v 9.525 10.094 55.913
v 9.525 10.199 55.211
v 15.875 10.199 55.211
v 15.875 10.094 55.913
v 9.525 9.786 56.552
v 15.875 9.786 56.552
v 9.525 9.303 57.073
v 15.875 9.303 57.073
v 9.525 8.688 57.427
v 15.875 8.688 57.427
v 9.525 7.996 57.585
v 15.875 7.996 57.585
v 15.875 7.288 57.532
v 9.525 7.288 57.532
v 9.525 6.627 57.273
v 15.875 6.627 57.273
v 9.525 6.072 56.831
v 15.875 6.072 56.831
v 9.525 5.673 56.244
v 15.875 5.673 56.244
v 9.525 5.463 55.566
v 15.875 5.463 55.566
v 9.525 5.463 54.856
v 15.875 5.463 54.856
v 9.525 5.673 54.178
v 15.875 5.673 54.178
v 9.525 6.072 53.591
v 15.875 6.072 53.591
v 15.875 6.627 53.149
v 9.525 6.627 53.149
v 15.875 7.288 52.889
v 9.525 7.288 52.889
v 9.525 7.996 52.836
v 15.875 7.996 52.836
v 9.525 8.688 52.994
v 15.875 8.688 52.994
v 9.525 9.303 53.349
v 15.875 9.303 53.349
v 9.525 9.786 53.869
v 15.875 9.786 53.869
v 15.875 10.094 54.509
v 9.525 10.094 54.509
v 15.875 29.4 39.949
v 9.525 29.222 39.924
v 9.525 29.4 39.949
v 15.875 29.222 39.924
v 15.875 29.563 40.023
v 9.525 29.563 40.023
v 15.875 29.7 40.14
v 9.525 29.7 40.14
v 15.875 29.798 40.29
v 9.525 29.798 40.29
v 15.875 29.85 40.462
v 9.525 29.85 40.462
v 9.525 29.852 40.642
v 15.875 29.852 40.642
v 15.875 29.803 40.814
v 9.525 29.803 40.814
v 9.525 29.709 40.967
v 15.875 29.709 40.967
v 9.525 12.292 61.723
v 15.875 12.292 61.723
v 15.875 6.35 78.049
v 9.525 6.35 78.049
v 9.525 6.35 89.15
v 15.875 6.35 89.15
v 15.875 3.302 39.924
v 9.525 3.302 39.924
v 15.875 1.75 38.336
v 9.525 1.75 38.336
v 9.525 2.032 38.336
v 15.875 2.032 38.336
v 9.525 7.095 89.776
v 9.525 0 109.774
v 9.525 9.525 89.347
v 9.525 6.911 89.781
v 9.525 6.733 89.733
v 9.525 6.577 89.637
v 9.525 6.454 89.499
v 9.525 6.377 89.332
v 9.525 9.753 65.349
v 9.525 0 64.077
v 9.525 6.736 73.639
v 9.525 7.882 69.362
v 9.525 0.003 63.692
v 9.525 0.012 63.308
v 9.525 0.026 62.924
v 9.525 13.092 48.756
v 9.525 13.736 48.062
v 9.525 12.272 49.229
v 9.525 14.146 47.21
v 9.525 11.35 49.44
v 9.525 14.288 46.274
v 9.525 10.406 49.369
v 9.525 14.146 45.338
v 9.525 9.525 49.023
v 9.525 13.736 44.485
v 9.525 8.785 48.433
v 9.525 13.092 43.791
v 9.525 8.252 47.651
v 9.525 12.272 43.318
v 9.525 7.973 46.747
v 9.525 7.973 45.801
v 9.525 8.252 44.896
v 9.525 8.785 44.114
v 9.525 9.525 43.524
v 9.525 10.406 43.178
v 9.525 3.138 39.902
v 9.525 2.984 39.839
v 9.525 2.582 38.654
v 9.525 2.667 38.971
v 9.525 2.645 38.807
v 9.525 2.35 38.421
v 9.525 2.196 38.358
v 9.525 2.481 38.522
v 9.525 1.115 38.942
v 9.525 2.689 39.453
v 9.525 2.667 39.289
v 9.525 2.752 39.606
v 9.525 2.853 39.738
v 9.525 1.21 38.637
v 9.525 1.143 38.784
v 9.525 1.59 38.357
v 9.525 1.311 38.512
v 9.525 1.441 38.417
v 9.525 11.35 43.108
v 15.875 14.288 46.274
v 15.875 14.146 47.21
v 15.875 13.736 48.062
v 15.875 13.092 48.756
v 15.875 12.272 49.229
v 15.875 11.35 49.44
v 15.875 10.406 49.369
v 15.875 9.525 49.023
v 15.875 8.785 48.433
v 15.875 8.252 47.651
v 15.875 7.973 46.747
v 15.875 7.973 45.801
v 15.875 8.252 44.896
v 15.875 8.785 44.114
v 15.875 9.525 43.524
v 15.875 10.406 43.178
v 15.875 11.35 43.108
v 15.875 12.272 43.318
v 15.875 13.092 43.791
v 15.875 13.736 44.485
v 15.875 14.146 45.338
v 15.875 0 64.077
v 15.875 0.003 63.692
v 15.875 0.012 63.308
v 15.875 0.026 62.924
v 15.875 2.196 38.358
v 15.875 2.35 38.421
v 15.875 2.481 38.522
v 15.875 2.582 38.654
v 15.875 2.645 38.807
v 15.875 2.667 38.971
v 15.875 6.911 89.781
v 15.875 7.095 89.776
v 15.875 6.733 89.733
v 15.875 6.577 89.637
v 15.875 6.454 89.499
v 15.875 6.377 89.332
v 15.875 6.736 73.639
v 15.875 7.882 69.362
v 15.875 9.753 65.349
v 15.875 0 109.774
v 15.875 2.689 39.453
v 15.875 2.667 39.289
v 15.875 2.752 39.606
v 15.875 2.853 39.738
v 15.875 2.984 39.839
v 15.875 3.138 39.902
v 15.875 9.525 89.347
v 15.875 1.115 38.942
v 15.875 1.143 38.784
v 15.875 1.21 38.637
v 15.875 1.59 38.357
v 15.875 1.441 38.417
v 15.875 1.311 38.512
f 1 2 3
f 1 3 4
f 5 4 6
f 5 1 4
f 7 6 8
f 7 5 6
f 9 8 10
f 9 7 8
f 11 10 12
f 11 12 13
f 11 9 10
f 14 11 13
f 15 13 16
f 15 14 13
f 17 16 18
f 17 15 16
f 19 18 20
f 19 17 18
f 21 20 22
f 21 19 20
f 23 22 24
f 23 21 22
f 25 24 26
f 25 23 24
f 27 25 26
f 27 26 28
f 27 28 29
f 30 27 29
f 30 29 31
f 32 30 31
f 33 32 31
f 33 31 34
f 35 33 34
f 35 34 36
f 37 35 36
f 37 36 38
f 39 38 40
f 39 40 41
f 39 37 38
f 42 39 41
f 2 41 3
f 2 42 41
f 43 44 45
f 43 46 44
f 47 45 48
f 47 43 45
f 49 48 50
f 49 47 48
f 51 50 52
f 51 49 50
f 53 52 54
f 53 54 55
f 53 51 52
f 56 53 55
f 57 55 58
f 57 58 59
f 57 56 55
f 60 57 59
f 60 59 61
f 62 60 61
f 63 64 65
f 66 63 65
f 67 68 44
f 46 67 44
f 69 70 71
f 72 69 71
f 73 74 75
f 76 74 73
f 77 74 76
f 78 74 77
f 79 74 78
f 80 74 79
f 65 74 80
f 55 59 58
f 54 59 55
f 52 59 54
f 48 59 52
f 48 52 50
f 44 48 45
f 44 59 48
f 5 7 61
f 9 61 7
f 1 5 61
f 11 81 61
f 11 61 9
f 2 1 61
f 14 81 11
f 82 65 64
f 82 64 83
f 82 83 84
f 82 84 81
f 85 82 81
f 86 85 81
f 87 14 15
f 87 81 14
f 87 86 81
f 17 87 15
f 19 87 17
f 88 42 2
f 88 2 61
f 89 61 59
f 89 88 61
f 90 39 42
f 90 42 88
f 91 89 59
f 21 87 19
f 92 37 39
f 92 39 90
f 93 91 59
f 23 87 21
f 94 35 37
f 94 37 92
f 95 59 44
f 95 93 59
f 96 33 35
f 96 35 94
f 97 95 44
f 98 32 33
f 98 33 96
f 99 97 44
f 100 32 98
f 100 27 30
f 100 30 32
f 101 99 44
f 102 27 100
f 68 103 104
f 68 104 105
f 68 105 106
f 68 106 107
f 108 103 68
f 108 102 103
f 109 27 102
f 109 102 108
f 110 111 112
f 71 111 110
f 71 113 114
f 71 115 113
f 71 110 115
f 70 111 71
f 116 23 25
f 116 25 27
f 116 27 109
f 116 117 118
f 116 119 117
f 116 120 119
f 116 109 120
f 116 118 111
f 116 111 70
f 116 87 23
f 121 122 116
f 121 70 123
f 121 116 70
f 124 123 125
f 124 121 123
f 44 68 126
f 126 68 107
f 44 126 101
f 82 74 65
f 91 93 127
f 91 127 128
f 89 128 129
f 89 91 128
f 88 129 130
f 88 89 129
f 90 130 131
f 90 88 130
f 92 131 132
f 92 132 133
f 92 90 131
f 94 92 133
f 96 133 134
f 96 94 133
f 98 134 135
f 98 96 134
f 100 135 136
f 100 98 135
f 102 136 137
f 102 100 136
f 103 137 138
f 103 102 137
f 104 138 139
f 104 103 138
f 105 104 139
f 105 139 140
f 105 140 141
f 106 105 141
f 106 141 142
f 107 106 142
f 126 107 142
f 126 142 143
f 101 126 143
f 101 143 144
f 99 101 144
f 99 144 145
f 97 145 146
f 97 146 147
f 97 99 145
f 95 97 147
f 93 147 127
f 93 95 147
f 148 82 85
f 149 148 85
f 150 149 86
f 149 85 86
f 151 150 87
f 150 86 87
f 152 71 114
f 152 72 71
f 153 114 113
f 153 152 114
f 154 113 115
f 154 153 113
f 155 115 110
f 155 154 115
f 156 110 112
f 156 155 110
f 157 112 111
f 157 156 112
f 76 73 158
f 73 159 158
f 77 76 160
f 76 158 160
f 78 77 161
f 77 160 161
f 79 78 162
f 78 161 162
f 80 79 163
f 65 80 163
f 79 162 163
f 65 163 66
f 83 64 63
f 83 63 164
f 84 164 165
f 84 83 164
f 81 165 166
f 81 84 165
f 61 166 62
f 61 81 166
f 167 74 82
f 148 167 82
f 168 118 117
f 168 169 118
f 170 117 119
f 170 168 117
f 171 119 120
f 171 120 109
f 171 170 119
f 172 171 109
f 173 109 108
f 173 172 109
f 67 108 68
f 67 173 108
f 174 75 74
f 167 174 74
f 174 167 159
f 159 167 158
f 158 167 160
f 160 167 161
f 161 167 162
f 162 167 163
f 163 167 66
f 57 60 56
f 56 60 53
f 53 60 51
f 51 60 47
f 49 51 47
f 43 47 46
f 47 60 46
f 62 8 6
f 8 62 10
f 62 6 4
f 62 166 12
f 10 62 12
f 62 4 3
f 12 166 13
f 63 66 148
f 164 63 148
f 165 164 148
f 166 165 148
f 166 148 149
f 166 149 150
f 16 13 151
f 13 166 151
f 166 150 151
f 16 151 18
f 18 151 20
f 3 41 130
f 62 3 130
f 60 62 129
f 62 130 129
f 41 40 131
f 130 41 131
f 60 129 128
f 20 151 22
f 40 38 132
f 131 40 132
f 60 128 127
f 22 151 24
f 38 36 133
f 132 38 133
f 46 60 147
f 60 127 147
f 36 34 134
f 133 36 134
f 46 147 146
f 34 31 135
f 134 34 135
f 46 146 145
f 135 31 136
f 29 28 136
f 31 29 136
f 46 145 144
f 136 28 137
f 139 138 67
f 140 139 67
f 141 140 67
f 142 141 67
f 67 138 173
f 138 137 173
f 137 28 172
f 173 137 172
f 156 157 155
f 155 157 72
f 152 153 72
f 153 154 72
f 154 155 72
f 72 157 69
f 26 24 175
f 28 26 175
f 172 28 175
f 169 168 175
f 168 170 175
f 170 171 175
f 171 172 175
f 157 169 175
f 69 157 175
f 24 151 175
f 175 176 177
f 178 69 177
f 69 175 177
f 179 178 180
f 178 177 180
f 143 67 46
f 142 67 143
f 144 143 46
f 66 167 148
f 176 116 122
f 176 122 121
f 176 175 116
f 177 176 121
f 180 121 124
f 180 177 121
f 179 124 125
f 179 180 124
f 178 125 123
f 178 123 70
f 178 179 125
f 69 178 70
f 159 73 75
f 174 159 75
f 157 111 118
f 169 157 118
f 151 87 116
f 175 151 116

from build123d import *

# Parameters (mm, degrees)
STOCK_BEE_ZERKER_START                       = 9.525
STOCK_BEE_ZERKER_2_0_MULTIBODY_1_OUTLINE_R   = 3.175
STOCK_BEE_ZERKER_2_0_MULTIBODY_1_OUTLINE_R_2 = 2.38125
STOCK_BEE_ZERKER_2_0_MULTIBODY_1_DEPTH       = 6.35
FILLET1_R                                    = 0.635
FILLET2_R                                    = 25.4


# Read off the part's stored shape, not the designer's step: Stock-Bee-zerker 2.0 Multibody-1
with BuildPart() as part:
    # Stock-Bee-zerker 2.0 Multibody-1 outline → Stock-Bee-zerker 2.0 Multibody-1 (new body)
    with BuildSketch(Plane.YZ.offset(STOCK_BEE_ZERKER_START)):
        Polygon((0, 63.5), (1.143, 38.33622), (2.667, 38.33622), (2.667, 39.92372), (30.58384403, 39.92372), (6.35, 68.804490685), (6.35, 89.907129746), (9.525, 89.347291582), (0, 109.77372), align=None)
        with Locations((11.1125, 46.27372)):
            Circle(STOCK_BEE_ZERKER_2_0_MULTIBODY_1_OUTLINE_R, mode=Mode.SUBTRACT)
        with Locations((7.818068754, 55.210853084)):
            Circle(STOCK_BEE_ZERKER_2_0_MULTIBODY_1_OUTLINE_R_2, mode=Mode.SUBTRACT)
    extrude(amount=STOCK_BEE_ZERKER_2_0_MULTIBODY_1_DEPTH)

    # Fillet1
    fillet1_edges = [part.edges().sort_by_distance(p)[0] for p in [
        (12.7, 6.35, 89.907129746),
        (12.7, 30.58384403, 39.92372),
        (12.7, 2.667, 39.92372),
        (12.7, 2.667, 38.33622),
        (12.7, 1.143, 38.33622),
    ]]
    fillet(fillet1_edges, radius=FILLET1_R)

    # Fillet2
    # the kernel refuses this fillet: 25.4 mm, written as the material it adds along each edge
    with BuildSketch(Plane(origin=(9.525, 6.35, 68.804490685), x_dir=(0, 0, 1), z_dir=(1, 0, 0))) as fillet2_piece_1:
        with BuildLine():
            CenterArc((FILLET2_R * 0.363970234267, -FILLET2_R), FILLET2_R, 90, 40)
            Line((-FILLET2_R * 0.278817375421, -FILLET2_R * 0.233955556882), (0, 0))
            Line((0, 0), (FILLET2_R * 0.363970234267, 0))
        make_face()
    extrude(amount=6.35)
    # the kernel refuses this fillet: 25.4 mm, written as the material it takes off along each edge
    with BuildSketch(Plane(origin=(8.083580992, 0, 63.5), x_dir=(0, 0.0453756432593108, -0.9989699950442975), z_dir=(1, 0, 0))) as fillet2_2_piece_1:
        with BuildLine():
            CenterArc((FILLET2_R * 0.0226995119346, FILLET2_R), FILLET2_R, 267.399274167, 2.600725833)
            Line((-FILLET2_R * 0.0226761313248, FILLET2_R * 0.0010300049557), (0, 0))
            Line((0, 0), (FILLET2_R * 0.0226995119345, 0))
        make_face()
    extrude(amount=9.232838016, mode=Mode.SUBTRACT)


solid = part.part
